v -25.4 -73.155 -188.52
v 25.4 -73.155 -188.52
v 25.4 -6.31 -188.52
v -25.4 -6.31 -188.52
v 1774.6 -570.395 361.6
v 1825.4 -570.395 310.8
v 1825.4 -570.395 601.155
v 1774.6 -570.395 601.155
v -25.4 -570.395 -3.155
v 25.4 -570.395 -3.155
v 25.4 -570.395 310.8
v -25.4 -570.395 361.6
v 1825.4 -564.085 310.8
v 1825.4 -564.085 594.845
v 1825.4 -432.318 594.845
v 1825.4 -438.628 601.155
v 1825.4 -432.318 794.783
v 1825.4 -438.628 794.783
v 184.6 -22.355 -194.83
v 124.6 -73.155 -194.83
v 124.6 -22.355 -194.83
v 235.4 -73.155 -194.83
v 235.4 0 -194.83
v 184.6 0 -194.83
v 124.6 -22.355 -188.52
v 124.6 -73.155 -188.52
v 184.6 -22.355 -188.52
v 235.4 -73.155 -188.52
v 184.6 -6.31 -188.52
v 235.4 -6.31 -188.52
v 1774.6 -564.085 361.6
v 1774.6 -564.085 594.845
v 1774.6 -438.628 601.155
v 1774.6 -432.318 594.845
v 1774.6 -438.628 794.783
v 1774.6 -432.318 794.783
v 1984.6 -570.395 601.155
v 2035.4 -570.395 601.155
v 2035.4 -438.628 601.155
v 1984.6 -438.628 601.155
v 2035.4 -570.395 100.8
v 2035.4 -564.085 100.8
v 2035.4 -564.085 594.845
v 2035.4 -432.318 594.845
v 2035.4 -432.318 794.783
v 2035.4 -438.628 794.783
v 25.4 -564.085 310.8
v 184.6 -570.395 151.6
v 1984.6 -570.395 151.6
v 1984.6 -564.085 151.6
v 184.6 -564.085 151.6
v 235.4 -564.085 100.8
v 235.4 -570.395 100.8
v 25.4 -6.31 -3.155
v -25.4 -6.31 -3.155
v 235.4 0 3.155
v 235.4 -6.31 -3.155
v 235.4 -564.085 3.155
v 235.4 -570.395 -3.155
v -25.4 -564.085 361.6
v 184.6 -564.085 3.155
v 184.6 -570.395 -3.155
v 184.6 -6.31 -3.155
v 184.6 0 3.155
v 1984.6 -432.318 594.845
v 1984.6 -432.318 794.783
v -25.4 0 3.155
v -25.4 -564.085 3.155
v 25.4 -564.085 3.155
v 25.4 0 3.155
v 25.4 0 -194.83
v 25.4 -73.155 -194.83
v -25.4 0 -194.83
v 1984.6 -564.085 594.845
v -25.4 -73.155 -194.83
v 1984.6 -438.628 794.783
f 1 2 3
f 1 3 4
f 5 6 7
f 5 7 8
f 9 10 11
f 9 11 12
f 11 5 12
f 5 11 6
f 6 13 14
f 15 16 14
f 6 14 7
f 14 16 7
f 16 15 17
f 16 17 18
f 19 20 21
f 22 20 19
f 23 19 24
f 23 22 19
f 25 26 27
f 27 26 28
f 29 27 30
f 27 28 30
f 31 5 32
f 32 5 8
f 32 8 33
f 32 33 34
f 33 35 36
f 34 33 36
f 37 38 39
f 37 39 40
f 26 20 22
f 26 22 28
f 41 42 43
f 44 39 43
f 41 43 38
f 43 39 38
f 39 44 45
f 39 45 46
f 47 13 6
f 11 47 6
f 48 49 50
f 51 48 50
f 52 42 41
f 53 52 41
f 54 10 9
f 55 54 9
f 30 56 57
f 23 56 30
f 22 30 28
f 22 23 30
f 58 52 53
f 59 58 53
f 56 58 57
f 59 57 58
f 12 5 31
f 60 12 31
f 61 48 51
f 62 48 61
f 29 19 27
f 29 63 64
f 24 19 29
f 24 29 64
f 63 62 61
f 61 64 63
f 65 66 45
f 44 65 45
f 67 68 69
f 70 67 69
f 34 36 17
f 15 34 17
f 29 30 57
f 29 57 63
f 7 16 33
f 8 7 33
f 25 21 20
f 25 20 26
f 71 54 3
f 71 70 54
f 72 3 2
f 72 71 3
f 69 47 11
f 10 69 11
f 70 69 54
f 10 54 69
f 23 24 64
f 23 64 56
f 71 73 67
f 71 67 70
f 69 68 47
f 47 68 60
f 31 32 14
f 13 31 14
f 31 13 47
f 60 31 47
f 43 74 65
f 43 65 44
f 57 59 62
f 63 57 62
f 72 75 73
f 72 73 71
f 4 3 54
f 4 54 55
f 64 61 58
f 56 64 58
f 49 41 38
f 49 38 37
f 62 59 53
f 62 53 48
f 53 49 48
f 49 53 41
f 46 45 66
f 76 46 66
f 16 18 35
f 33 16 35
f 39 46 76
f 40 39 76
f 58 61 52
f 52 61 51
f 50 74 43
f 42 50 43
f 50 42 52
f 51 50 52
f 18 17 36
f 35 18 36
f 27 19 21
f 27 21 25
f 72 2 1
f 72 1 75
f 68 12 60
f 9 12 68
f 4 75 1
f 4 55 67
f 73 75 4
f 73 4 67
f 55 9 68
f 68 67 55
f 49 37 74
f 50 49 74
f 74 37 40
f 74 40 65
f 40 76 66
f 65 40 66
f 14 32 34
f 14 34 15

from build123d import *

# Parameters (mm, degrees)
CROQUIS2_W              = 50.8
CROQUIS2_H              = 6.31
CROQUIS3_W              = 50.8
CROQUIS3_H              = 6.31
CROQUIS7_W              = 6.31
CROQUIS7_H              = 50.8
SALIENTE_EXTRUIR1_DEPTH = 60


with BuildPart() as part:
    # Barrer1: sweep along a curve in space
    with BuildLine() as barrer1_path:
        Line((0, 0, 0), (0, -567.24, 0))
        Line((0, -567.24, 0), (0, -567.24, 336.2))
        Line((0, -567.24, 336.2), (1800, -567.24, 336.2))
        Line((1800, -567.24, 336.2), (1800, -567.24, 598))
        Line((1800, -567.24, 598), (1800, -435.47278313, 598))
        Line((1800, -435.47278313, 598), (1800, -435.47278313, 794.782933))
    # Croquis2 → Barrer1 (sweep)
    with BuildSketch(Plane(origin=(0, 0, 0), x_dir=(1, 0, 0), z_dir=(0, 1, 0))):
        Rectangle(CROQUIS2_W, CROQUIS2_H)
        with Locations((210, 0)):
            Rectangle(CROQUIS2_W, CROQUIS2_H)
    sweep(path=barrer1_path.line, transition=Transition.RIGHT)

    # Barrer4: sweep along a curve in space
    with BuildLine() as barrer4_path:
        Line((-0.201028049, -3.155, -3.155), (-0.201028049, -3.155, -191.675))
        Line((-0.201028049, -3.155, -191.675), (-0.201028049, -73.155, -191.675))
    # Croquis3 → Barrer4 (sweep)
    with BuildSketch(Plane(origin=(0, 0, -3.155), x_dir=(-1, 0, 0), z_dir=(0, 0, -1))):
        with Locations((-210, -3.155)):
            Rectangle(CROQUIS3_W, CROQUIS3_H)
        with Locations((0, -3.155)):
            Rectangle(CROQUIS3_W, CROQUIS3_H)
    sweep(path=barrer4_path.line, transition=Transition.RIGHT)

    # Croquis7 → Saliente-Extruir1 (add)
    with BuildSketch(Plane.ZY.offset(-184.6)):
        with Locations((-191.675, -47.755)):
            Rectangle(CROQUIS7_W, CROQUIS7_H)
    extrude(amount=SALIENTE_EXTRUIR1_DEPTH)


solid = part.part
